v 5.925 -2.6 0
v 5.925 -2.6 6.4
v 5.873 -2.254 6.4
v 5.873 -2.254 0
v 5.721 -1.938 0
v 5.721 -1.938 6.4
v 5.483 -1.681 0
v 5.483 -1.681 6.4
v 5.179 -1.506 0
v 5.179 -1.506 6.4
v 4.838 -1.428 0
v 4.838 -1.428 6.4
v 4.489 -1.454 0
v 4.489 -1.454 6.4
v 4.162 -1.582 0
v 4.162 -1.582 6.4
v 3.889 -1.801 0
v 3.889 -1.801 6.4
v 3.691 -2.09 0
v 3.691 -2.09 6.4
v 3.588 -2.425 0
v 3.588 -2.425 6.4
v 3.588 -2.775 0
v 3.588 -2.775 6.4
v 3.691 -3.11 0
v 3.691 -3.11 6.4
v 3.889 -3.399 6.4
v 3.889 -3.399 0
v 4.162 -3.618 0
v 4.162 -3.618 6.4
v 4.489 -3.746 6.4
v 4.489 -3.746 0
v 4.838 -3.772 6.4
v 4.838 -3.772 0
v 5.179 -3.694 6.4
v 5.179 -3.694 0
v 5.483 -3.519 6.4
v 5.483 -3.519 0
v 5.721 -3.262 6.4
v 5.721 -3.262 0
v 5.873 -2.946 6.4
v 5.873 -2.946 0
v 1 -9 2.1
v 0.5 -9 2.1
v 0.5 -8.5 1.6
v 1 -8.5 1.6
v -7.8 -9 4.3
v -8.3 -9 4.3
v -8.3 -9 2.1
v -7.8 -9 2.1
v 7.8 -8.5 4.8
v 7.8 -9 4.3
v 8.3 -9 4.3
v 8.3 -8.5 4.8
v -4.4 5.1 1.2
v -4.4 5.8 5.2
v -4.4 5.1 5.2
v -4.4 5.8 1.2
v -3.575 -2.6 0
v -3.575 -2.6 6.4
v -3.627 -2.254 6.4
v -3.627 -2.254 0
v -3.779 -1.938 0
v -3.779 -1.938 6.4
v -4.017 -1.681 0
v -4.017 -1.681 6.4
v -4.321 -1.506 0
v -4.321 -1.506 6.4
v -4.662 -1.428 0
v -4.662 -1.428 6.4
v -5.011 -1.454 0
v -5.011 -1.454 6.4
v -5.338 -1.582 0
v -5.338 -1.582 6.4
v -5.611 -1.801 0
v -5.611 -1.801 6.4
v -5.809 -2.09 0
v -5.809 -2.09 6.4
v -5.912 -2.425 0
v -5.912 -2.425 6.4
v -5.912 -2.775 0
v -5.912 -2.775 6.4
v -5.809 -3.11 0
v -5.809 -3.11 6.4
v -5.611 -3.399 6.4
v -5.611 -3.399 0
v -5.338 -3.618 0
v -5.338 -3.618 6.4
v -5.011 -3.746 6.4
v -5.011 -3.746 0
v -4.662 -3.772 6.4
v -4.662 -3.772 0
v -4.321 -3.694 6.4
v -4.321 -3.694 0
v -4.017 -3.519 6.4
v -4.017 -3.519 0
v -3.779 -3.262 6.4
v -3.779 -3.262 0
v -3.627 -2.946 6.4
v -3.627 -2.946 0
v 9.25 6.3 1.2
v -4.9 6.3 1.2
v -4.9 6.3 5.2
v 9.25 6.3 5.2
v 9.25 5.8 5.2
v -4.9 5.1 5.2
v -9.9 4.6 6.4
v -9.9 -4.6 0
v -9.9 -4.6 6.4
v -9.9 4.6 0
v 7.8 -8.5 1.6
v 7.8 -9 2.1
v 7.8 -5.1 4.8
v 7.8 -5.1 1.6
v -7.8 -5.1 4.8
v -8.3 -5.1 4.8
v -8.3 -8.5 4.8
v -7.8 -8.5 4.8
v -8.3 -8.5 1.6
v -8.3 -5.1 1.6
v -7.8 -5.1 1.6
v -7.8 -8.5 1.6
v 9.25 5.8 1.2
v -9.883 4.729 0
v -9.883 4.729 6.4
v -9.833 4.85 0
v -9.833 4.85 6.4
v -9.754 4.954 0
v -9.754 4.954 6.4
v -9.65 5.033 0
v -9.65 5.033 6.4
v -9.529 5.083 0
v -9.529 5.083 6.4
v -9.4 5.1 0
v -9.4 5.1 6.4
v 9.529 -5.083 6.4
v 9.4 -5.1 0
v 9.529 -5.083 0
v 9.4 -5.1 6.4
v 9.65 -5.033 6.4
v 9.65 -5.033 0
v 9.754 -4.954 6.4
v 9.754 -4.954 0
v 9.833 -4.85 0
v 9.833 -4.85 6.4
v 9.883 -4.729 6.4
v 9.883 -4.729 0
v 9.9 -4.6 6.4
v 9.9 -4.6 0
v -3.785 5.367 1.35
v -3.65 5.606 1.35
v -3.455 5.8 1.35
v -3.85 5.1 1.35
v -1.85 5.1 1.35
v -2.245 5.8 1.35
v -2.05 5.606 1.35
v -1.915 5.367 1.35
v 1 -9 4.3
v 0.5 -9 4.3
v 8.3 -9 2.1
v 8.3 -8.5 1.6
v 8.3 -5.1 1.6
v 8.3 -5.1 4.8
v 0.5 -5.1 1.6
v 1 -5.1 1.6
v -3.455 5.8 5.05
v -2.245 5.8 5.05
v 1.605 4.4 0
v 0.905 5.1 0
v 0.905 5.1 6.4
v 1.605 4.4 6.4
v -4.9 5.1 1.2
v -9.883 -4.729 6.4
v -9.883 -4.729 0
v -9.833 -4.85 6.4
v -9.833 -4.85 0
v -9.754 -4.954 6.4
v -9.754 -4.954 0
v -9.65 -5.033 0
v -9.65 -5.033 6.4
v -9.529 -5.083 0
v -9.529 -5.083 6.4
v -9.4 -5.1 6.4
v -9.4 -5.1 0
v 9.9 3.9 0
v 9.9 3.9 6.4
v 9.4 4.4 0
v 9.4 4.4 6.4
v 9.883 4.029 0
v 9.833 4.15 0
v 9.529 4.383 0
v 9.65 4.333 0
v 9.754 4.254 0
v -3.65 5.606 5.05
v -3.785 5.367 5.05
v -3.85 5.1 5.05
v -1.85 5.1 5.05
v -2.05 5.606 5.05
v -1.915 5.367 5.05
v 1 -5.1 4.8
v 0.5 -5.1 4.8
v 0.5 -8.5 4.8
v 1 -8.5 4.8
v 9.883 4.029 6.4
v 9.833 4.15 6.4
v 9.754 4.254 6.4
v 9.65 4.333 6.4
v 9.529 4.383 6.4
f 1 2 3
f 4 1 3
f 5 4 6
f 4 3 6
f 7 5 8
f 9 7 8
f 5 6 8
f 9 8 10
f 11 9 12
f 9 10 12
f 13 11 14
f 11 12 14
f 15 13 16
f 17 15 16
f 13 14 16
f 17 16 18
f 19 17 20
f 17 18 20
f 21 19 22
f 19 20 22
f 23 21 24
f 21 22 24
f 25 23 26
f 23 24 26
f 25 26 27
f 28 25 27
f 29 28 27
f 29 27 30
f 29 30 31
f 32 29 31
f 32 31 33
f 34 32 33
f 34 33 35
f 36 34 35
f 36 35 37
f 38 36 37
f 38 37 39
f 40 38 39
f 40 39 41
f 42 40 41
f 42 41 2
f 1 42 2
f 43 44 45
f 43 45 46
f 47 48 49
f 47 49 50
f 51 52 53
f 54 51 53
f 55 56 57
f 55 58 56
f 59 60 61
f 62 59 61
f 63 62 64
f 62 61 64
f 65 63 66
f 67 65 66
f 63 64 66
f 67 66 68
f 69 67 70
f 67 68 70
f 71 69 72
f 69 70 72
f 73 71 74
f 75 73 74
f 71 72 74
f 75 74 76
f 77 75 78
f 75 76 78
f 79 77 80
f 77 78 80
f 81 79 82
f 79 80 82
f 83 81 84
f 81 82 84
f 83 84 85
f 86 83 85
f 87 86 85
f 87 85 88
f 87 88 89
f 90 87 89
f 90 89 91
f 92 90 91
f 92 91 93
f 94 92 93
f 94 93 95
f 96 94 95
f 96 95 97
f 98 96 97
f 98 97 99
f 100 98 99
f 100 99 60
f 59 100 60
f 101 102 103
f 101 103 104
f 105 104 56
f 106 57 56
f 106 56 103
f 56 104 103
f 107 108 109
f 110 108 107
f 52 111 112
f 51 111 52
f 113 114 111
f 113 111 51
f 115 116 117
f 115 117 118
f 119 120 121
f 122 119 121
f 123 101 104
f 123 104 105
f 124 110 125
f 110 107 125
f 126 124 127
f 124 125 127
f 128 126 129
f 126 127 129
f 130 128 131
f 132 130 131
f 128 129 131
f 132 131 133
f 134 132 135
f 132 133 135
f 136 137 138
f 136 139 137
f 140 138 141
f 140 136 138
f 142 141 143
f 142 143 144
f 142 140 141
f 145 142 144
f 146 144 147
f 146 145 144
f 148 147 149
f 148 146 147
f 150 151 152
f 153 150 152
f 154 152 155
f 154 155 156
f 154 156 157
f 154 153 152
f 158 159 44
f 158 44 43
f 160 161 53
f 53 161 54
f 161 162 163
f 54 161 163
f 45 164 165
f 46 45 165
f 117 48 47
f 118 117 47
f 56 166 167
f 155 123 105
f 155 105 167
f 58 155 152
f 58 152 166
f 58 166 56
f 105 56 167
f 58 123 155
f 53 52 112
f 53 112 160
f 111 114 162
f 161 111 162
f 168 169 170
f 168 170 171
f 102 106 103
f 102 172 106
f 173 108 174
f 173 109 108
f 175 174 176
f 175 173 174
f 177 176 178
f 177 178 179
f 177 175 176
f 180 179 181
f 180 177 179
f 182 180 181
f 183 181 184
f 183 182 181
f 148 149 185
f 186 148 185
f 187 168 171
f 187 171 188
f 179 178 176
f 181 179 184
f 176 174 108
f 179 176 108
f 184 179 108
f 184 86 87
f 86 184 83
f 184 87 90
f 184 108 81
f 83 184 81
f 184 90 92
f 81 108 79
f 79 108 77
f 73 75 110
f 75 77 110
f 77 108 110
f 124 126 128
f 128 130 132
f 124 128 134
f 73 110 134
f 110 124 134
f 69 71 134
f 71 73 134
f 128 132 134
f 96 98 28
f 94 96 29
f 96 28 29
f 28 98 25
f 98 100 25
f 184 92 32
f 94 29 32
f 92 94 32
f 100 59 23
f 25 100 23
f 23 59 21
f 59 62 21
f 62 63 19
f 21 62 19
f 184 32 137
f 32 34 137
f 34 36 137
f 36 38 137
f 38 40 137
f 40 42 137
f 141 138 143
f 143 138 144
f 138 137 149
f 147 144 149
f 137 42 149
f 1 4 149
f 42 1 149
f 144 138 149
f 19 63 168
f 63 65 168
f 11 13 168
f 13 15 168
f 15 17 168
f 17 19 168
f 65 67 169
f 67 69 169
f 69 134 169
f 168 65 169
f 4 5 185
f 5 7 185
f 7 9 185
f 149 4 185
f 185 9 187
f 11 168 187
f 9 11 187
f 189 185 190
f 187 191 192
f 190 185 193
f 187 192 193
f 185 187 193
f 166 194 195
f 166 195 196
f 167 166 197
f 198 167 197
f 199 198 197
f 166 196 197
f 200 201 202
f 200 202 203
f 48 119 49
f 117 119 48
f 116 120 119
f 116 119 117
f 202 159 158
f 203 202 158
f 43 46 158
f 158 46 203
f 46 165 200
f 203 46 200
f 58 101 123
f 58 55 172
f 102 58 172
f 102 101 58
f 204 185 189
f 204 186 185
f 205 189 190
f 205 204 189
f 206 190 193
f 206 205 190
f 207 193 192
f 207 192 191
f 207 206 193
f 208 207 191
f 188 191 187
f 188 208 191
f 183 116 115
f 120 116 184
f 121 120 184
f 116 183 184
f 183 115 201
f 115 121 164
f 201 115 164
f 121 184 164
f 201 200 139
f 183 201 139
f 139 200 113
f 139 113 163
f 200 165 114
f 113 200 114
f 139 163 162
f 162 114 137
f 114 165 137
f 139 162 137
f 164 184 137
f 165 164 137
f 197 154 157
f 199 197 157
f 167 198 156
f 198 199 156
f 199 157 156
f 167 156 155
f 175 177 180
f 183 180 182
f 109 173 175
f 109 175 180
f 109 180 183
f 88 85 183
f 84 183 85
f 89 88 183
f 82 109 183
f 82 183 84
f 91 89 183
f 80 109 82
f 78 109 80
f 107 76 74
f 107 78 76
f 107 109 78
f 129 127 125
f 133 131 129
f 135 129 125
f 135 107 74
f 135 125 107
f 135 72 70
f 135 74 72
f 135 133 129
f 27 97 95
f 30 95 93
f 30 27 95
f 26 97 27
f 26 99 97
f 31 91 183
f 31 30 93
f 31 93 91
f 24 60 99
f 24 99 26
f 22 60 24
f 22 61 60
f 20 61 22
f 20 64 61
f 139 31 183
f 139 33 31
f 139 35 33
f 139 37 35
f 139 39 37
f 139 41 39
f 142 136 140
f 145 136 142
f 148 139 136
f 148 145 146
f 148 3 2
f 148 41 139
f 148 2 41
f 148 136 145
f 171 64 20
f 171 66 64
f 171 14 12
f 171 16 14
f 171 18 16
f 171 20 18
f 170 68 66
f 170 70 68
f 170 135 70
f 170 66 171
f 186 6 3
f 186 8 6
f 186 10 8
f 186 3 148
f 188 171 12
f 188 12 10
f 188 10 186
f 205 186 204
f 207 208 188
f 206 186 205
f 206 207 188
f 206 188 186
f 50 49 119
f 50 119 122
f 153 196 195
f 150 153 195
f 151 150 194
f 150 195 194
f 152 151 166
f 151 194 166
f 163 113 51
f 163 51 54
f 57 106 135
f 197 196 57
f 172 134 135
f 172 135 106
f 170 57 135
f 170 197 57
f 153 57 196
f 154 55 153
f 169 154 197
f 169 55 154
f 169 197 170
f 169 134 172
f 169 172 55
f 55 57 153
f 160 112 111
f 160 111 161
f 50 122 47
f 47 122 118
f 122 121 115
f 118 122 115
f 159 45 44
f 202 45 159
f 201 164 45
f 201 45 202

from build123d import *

# Parameters (mm, degrees)
SKETCH_1_W               = 19.8
SKETCH_1_H               = 10.2
EXTRUDE_1_DEPTH          = 6.4
CUT_EXTRUDE_1_DEPTH      = 13.844454056
CUT_EXTRUDE_1_DEPTH_BACK = 13.844454056
SKETCH_3_R               = 1.175
CUT_EXTRUDE_2_DEPTH      = 13.844454056
SKETCH_4_W               = 2
SKETCH_4_H               = 3.7
EXTRUDE_2_DEPTH          = 0.9
FILLET_2_R               = 0.5
FILLET_3_R               = 1
SKETCH_6_W               = 0.5
SKETCH_6_H               = 3.2
EXTRUDE_3_DEPTH          = 3.9
CHAMFER_1_SIZE           = 0.5
EXTRUDE_4_DEPTH          = 2


with BuildPart() as part:
    # 草图1 → 凸台-拉伸1 (new body)
    with BuildSketch(Plane.XY):
        Rectangle(SKETCH_1_W, SKETCH_1_H)
    extrude(amount=EXTRUDE_1_DEPTH)

    # 草图2 → 切除-拉伸1 (cut, two sides: drawn at the far end of the back side and taken through both)
    with BuildSketch(Plane.XY.offset(6.4).offset(-CUT_EXTRUDE_1_DEPTH_BACK)):
        Polygon((9.9, 5.1), (0.905266145, 5.1), (1.605266145, 4.4), (9.9, 4.4), align=None)
    extrude(amount=CUT_EXTRUDE_1_DEPTH + CUT_EXTRUDE_1_DEPTH_BACK, mode=Mode.SUBTRACT)

    # 草图3 → 切除-拉伸2 (cut, through all)
    with BuildSketch(Plane.XY.offset(6.4)):
        with Locations((-4.75, -2.6)):
            Circle(SKETCH_3_R)
        with Locations((4.75, -2.6)):
            Circle(SKETCH_3_R)
    extrude(amount=-CUT_EXTRUDE_2_DEPTH, mode=Mode.SUBTRACT)

    # 草图4 → 凸台-拉伸2 (add)
    with BuildSketch(Plane(origin=(0, 5.1, 0), x_dir=(1, 0, 0), z_dir=(0, 1, 0))):
        with Locations((-2.85, -3.2)):
            Rectangle(SKETCH_4_W, SKETCH_4_H)
    extrude(amount=EXTRUDE_2_DEPTH)

    # 圆角2
    fillet_2_edges = [part.edges().sort_by_distance(p)[0] for p in [
        (9.9, 4.4, 3.2),
        (-9.9, 5.1, 3.2),
        (9.9, -5.1, 3.2),
        (-9.9, -5.1, 3.2),
    ]]
    fillet(fillet_2_edges, radius=FILLET_2_R)

    # 圆角3
    # the kernel refuses this fillet: 1 mm, written as the material it takes off along each edge
    with BuildSketch(Plane(origin=(-1.85, 6, -1.137468593), x_dir=(0, -1, 0), z_dir=(0, 0, 1)), Plane(origin=(-3.85, 6, 7.537468593), x_dir=(0, -1, 0), z_dir=(0, 0, -1))) as fillet_3_piece_1:
        with BuildLine():
            CenterArc((1, -0.994987437), FILLET_3_R, 95.739170477, 84.260829523)
            Line((0, -0.994987437), (-0.02, -0.994987437))
            Line((-0.02, -0.994987437), (-0.02, 0))
            Line((-0.02, 0), (0, 0.02))
            ThreePointArc((0, 0.02), (0.45, 0.02), (0.898, 0.019899749))
            Line((0.898, 0.019899749), (0.9, 0))
        make_face()
    extrude(amount=8.674937186, mode=Mode.SUBTRACT)

    # 草图6 → 凸台-拉伸3 (add)
    with BuildSketch(Plane.XZ.offset(5.1)):
        with Locations((-8.05, 3.2)):
            Rectangle(SKETCH_6_W, SKETCH_6_H)
        with Locations((0.75, 3.2)):
            Rectangle(SKETCH_6_W, SKETCH_6_H)
        with Locations((8.05, 3.2)):
            Rectangle(SKETCH_6_W, SKETCH_6_H)
    extrude(amount=EXTRUDE_3_DEPTH)

    # 倒角1
    chamfer_1_edges = [part.edges().sort_by_distance(p)[0] for p in [
        (0.75, -9, 4.8),
        (0.75, -9, 1.6),
        (8.05, -9, 4.8),
        (8.05, -9, 1.6),
        (-8.05, -9, 4.8),
        (-8.05, -9, 1.6),
    ]]
    chamfer(chamfer_1_edges, length=CHAMFER_1_SIZE)

    # 草图7 → 凸台-拉伸4 (add, symmetric)
    with BuildSketch(Plane(origin=(0, 0, 3.2), x_dir=(-1, 0, 0), z_dir=(0, 0, -1))):
        Polygon((4.9, 5.1), (4.9, 6.3), (-9.25, 6.3), (-9.25, 5.8), (4.4, 5.8), (4.4, 5.1), align=None)
    extrude(amount=EXTRUDE_4_DEPTH, both=True)


solid = part.part
